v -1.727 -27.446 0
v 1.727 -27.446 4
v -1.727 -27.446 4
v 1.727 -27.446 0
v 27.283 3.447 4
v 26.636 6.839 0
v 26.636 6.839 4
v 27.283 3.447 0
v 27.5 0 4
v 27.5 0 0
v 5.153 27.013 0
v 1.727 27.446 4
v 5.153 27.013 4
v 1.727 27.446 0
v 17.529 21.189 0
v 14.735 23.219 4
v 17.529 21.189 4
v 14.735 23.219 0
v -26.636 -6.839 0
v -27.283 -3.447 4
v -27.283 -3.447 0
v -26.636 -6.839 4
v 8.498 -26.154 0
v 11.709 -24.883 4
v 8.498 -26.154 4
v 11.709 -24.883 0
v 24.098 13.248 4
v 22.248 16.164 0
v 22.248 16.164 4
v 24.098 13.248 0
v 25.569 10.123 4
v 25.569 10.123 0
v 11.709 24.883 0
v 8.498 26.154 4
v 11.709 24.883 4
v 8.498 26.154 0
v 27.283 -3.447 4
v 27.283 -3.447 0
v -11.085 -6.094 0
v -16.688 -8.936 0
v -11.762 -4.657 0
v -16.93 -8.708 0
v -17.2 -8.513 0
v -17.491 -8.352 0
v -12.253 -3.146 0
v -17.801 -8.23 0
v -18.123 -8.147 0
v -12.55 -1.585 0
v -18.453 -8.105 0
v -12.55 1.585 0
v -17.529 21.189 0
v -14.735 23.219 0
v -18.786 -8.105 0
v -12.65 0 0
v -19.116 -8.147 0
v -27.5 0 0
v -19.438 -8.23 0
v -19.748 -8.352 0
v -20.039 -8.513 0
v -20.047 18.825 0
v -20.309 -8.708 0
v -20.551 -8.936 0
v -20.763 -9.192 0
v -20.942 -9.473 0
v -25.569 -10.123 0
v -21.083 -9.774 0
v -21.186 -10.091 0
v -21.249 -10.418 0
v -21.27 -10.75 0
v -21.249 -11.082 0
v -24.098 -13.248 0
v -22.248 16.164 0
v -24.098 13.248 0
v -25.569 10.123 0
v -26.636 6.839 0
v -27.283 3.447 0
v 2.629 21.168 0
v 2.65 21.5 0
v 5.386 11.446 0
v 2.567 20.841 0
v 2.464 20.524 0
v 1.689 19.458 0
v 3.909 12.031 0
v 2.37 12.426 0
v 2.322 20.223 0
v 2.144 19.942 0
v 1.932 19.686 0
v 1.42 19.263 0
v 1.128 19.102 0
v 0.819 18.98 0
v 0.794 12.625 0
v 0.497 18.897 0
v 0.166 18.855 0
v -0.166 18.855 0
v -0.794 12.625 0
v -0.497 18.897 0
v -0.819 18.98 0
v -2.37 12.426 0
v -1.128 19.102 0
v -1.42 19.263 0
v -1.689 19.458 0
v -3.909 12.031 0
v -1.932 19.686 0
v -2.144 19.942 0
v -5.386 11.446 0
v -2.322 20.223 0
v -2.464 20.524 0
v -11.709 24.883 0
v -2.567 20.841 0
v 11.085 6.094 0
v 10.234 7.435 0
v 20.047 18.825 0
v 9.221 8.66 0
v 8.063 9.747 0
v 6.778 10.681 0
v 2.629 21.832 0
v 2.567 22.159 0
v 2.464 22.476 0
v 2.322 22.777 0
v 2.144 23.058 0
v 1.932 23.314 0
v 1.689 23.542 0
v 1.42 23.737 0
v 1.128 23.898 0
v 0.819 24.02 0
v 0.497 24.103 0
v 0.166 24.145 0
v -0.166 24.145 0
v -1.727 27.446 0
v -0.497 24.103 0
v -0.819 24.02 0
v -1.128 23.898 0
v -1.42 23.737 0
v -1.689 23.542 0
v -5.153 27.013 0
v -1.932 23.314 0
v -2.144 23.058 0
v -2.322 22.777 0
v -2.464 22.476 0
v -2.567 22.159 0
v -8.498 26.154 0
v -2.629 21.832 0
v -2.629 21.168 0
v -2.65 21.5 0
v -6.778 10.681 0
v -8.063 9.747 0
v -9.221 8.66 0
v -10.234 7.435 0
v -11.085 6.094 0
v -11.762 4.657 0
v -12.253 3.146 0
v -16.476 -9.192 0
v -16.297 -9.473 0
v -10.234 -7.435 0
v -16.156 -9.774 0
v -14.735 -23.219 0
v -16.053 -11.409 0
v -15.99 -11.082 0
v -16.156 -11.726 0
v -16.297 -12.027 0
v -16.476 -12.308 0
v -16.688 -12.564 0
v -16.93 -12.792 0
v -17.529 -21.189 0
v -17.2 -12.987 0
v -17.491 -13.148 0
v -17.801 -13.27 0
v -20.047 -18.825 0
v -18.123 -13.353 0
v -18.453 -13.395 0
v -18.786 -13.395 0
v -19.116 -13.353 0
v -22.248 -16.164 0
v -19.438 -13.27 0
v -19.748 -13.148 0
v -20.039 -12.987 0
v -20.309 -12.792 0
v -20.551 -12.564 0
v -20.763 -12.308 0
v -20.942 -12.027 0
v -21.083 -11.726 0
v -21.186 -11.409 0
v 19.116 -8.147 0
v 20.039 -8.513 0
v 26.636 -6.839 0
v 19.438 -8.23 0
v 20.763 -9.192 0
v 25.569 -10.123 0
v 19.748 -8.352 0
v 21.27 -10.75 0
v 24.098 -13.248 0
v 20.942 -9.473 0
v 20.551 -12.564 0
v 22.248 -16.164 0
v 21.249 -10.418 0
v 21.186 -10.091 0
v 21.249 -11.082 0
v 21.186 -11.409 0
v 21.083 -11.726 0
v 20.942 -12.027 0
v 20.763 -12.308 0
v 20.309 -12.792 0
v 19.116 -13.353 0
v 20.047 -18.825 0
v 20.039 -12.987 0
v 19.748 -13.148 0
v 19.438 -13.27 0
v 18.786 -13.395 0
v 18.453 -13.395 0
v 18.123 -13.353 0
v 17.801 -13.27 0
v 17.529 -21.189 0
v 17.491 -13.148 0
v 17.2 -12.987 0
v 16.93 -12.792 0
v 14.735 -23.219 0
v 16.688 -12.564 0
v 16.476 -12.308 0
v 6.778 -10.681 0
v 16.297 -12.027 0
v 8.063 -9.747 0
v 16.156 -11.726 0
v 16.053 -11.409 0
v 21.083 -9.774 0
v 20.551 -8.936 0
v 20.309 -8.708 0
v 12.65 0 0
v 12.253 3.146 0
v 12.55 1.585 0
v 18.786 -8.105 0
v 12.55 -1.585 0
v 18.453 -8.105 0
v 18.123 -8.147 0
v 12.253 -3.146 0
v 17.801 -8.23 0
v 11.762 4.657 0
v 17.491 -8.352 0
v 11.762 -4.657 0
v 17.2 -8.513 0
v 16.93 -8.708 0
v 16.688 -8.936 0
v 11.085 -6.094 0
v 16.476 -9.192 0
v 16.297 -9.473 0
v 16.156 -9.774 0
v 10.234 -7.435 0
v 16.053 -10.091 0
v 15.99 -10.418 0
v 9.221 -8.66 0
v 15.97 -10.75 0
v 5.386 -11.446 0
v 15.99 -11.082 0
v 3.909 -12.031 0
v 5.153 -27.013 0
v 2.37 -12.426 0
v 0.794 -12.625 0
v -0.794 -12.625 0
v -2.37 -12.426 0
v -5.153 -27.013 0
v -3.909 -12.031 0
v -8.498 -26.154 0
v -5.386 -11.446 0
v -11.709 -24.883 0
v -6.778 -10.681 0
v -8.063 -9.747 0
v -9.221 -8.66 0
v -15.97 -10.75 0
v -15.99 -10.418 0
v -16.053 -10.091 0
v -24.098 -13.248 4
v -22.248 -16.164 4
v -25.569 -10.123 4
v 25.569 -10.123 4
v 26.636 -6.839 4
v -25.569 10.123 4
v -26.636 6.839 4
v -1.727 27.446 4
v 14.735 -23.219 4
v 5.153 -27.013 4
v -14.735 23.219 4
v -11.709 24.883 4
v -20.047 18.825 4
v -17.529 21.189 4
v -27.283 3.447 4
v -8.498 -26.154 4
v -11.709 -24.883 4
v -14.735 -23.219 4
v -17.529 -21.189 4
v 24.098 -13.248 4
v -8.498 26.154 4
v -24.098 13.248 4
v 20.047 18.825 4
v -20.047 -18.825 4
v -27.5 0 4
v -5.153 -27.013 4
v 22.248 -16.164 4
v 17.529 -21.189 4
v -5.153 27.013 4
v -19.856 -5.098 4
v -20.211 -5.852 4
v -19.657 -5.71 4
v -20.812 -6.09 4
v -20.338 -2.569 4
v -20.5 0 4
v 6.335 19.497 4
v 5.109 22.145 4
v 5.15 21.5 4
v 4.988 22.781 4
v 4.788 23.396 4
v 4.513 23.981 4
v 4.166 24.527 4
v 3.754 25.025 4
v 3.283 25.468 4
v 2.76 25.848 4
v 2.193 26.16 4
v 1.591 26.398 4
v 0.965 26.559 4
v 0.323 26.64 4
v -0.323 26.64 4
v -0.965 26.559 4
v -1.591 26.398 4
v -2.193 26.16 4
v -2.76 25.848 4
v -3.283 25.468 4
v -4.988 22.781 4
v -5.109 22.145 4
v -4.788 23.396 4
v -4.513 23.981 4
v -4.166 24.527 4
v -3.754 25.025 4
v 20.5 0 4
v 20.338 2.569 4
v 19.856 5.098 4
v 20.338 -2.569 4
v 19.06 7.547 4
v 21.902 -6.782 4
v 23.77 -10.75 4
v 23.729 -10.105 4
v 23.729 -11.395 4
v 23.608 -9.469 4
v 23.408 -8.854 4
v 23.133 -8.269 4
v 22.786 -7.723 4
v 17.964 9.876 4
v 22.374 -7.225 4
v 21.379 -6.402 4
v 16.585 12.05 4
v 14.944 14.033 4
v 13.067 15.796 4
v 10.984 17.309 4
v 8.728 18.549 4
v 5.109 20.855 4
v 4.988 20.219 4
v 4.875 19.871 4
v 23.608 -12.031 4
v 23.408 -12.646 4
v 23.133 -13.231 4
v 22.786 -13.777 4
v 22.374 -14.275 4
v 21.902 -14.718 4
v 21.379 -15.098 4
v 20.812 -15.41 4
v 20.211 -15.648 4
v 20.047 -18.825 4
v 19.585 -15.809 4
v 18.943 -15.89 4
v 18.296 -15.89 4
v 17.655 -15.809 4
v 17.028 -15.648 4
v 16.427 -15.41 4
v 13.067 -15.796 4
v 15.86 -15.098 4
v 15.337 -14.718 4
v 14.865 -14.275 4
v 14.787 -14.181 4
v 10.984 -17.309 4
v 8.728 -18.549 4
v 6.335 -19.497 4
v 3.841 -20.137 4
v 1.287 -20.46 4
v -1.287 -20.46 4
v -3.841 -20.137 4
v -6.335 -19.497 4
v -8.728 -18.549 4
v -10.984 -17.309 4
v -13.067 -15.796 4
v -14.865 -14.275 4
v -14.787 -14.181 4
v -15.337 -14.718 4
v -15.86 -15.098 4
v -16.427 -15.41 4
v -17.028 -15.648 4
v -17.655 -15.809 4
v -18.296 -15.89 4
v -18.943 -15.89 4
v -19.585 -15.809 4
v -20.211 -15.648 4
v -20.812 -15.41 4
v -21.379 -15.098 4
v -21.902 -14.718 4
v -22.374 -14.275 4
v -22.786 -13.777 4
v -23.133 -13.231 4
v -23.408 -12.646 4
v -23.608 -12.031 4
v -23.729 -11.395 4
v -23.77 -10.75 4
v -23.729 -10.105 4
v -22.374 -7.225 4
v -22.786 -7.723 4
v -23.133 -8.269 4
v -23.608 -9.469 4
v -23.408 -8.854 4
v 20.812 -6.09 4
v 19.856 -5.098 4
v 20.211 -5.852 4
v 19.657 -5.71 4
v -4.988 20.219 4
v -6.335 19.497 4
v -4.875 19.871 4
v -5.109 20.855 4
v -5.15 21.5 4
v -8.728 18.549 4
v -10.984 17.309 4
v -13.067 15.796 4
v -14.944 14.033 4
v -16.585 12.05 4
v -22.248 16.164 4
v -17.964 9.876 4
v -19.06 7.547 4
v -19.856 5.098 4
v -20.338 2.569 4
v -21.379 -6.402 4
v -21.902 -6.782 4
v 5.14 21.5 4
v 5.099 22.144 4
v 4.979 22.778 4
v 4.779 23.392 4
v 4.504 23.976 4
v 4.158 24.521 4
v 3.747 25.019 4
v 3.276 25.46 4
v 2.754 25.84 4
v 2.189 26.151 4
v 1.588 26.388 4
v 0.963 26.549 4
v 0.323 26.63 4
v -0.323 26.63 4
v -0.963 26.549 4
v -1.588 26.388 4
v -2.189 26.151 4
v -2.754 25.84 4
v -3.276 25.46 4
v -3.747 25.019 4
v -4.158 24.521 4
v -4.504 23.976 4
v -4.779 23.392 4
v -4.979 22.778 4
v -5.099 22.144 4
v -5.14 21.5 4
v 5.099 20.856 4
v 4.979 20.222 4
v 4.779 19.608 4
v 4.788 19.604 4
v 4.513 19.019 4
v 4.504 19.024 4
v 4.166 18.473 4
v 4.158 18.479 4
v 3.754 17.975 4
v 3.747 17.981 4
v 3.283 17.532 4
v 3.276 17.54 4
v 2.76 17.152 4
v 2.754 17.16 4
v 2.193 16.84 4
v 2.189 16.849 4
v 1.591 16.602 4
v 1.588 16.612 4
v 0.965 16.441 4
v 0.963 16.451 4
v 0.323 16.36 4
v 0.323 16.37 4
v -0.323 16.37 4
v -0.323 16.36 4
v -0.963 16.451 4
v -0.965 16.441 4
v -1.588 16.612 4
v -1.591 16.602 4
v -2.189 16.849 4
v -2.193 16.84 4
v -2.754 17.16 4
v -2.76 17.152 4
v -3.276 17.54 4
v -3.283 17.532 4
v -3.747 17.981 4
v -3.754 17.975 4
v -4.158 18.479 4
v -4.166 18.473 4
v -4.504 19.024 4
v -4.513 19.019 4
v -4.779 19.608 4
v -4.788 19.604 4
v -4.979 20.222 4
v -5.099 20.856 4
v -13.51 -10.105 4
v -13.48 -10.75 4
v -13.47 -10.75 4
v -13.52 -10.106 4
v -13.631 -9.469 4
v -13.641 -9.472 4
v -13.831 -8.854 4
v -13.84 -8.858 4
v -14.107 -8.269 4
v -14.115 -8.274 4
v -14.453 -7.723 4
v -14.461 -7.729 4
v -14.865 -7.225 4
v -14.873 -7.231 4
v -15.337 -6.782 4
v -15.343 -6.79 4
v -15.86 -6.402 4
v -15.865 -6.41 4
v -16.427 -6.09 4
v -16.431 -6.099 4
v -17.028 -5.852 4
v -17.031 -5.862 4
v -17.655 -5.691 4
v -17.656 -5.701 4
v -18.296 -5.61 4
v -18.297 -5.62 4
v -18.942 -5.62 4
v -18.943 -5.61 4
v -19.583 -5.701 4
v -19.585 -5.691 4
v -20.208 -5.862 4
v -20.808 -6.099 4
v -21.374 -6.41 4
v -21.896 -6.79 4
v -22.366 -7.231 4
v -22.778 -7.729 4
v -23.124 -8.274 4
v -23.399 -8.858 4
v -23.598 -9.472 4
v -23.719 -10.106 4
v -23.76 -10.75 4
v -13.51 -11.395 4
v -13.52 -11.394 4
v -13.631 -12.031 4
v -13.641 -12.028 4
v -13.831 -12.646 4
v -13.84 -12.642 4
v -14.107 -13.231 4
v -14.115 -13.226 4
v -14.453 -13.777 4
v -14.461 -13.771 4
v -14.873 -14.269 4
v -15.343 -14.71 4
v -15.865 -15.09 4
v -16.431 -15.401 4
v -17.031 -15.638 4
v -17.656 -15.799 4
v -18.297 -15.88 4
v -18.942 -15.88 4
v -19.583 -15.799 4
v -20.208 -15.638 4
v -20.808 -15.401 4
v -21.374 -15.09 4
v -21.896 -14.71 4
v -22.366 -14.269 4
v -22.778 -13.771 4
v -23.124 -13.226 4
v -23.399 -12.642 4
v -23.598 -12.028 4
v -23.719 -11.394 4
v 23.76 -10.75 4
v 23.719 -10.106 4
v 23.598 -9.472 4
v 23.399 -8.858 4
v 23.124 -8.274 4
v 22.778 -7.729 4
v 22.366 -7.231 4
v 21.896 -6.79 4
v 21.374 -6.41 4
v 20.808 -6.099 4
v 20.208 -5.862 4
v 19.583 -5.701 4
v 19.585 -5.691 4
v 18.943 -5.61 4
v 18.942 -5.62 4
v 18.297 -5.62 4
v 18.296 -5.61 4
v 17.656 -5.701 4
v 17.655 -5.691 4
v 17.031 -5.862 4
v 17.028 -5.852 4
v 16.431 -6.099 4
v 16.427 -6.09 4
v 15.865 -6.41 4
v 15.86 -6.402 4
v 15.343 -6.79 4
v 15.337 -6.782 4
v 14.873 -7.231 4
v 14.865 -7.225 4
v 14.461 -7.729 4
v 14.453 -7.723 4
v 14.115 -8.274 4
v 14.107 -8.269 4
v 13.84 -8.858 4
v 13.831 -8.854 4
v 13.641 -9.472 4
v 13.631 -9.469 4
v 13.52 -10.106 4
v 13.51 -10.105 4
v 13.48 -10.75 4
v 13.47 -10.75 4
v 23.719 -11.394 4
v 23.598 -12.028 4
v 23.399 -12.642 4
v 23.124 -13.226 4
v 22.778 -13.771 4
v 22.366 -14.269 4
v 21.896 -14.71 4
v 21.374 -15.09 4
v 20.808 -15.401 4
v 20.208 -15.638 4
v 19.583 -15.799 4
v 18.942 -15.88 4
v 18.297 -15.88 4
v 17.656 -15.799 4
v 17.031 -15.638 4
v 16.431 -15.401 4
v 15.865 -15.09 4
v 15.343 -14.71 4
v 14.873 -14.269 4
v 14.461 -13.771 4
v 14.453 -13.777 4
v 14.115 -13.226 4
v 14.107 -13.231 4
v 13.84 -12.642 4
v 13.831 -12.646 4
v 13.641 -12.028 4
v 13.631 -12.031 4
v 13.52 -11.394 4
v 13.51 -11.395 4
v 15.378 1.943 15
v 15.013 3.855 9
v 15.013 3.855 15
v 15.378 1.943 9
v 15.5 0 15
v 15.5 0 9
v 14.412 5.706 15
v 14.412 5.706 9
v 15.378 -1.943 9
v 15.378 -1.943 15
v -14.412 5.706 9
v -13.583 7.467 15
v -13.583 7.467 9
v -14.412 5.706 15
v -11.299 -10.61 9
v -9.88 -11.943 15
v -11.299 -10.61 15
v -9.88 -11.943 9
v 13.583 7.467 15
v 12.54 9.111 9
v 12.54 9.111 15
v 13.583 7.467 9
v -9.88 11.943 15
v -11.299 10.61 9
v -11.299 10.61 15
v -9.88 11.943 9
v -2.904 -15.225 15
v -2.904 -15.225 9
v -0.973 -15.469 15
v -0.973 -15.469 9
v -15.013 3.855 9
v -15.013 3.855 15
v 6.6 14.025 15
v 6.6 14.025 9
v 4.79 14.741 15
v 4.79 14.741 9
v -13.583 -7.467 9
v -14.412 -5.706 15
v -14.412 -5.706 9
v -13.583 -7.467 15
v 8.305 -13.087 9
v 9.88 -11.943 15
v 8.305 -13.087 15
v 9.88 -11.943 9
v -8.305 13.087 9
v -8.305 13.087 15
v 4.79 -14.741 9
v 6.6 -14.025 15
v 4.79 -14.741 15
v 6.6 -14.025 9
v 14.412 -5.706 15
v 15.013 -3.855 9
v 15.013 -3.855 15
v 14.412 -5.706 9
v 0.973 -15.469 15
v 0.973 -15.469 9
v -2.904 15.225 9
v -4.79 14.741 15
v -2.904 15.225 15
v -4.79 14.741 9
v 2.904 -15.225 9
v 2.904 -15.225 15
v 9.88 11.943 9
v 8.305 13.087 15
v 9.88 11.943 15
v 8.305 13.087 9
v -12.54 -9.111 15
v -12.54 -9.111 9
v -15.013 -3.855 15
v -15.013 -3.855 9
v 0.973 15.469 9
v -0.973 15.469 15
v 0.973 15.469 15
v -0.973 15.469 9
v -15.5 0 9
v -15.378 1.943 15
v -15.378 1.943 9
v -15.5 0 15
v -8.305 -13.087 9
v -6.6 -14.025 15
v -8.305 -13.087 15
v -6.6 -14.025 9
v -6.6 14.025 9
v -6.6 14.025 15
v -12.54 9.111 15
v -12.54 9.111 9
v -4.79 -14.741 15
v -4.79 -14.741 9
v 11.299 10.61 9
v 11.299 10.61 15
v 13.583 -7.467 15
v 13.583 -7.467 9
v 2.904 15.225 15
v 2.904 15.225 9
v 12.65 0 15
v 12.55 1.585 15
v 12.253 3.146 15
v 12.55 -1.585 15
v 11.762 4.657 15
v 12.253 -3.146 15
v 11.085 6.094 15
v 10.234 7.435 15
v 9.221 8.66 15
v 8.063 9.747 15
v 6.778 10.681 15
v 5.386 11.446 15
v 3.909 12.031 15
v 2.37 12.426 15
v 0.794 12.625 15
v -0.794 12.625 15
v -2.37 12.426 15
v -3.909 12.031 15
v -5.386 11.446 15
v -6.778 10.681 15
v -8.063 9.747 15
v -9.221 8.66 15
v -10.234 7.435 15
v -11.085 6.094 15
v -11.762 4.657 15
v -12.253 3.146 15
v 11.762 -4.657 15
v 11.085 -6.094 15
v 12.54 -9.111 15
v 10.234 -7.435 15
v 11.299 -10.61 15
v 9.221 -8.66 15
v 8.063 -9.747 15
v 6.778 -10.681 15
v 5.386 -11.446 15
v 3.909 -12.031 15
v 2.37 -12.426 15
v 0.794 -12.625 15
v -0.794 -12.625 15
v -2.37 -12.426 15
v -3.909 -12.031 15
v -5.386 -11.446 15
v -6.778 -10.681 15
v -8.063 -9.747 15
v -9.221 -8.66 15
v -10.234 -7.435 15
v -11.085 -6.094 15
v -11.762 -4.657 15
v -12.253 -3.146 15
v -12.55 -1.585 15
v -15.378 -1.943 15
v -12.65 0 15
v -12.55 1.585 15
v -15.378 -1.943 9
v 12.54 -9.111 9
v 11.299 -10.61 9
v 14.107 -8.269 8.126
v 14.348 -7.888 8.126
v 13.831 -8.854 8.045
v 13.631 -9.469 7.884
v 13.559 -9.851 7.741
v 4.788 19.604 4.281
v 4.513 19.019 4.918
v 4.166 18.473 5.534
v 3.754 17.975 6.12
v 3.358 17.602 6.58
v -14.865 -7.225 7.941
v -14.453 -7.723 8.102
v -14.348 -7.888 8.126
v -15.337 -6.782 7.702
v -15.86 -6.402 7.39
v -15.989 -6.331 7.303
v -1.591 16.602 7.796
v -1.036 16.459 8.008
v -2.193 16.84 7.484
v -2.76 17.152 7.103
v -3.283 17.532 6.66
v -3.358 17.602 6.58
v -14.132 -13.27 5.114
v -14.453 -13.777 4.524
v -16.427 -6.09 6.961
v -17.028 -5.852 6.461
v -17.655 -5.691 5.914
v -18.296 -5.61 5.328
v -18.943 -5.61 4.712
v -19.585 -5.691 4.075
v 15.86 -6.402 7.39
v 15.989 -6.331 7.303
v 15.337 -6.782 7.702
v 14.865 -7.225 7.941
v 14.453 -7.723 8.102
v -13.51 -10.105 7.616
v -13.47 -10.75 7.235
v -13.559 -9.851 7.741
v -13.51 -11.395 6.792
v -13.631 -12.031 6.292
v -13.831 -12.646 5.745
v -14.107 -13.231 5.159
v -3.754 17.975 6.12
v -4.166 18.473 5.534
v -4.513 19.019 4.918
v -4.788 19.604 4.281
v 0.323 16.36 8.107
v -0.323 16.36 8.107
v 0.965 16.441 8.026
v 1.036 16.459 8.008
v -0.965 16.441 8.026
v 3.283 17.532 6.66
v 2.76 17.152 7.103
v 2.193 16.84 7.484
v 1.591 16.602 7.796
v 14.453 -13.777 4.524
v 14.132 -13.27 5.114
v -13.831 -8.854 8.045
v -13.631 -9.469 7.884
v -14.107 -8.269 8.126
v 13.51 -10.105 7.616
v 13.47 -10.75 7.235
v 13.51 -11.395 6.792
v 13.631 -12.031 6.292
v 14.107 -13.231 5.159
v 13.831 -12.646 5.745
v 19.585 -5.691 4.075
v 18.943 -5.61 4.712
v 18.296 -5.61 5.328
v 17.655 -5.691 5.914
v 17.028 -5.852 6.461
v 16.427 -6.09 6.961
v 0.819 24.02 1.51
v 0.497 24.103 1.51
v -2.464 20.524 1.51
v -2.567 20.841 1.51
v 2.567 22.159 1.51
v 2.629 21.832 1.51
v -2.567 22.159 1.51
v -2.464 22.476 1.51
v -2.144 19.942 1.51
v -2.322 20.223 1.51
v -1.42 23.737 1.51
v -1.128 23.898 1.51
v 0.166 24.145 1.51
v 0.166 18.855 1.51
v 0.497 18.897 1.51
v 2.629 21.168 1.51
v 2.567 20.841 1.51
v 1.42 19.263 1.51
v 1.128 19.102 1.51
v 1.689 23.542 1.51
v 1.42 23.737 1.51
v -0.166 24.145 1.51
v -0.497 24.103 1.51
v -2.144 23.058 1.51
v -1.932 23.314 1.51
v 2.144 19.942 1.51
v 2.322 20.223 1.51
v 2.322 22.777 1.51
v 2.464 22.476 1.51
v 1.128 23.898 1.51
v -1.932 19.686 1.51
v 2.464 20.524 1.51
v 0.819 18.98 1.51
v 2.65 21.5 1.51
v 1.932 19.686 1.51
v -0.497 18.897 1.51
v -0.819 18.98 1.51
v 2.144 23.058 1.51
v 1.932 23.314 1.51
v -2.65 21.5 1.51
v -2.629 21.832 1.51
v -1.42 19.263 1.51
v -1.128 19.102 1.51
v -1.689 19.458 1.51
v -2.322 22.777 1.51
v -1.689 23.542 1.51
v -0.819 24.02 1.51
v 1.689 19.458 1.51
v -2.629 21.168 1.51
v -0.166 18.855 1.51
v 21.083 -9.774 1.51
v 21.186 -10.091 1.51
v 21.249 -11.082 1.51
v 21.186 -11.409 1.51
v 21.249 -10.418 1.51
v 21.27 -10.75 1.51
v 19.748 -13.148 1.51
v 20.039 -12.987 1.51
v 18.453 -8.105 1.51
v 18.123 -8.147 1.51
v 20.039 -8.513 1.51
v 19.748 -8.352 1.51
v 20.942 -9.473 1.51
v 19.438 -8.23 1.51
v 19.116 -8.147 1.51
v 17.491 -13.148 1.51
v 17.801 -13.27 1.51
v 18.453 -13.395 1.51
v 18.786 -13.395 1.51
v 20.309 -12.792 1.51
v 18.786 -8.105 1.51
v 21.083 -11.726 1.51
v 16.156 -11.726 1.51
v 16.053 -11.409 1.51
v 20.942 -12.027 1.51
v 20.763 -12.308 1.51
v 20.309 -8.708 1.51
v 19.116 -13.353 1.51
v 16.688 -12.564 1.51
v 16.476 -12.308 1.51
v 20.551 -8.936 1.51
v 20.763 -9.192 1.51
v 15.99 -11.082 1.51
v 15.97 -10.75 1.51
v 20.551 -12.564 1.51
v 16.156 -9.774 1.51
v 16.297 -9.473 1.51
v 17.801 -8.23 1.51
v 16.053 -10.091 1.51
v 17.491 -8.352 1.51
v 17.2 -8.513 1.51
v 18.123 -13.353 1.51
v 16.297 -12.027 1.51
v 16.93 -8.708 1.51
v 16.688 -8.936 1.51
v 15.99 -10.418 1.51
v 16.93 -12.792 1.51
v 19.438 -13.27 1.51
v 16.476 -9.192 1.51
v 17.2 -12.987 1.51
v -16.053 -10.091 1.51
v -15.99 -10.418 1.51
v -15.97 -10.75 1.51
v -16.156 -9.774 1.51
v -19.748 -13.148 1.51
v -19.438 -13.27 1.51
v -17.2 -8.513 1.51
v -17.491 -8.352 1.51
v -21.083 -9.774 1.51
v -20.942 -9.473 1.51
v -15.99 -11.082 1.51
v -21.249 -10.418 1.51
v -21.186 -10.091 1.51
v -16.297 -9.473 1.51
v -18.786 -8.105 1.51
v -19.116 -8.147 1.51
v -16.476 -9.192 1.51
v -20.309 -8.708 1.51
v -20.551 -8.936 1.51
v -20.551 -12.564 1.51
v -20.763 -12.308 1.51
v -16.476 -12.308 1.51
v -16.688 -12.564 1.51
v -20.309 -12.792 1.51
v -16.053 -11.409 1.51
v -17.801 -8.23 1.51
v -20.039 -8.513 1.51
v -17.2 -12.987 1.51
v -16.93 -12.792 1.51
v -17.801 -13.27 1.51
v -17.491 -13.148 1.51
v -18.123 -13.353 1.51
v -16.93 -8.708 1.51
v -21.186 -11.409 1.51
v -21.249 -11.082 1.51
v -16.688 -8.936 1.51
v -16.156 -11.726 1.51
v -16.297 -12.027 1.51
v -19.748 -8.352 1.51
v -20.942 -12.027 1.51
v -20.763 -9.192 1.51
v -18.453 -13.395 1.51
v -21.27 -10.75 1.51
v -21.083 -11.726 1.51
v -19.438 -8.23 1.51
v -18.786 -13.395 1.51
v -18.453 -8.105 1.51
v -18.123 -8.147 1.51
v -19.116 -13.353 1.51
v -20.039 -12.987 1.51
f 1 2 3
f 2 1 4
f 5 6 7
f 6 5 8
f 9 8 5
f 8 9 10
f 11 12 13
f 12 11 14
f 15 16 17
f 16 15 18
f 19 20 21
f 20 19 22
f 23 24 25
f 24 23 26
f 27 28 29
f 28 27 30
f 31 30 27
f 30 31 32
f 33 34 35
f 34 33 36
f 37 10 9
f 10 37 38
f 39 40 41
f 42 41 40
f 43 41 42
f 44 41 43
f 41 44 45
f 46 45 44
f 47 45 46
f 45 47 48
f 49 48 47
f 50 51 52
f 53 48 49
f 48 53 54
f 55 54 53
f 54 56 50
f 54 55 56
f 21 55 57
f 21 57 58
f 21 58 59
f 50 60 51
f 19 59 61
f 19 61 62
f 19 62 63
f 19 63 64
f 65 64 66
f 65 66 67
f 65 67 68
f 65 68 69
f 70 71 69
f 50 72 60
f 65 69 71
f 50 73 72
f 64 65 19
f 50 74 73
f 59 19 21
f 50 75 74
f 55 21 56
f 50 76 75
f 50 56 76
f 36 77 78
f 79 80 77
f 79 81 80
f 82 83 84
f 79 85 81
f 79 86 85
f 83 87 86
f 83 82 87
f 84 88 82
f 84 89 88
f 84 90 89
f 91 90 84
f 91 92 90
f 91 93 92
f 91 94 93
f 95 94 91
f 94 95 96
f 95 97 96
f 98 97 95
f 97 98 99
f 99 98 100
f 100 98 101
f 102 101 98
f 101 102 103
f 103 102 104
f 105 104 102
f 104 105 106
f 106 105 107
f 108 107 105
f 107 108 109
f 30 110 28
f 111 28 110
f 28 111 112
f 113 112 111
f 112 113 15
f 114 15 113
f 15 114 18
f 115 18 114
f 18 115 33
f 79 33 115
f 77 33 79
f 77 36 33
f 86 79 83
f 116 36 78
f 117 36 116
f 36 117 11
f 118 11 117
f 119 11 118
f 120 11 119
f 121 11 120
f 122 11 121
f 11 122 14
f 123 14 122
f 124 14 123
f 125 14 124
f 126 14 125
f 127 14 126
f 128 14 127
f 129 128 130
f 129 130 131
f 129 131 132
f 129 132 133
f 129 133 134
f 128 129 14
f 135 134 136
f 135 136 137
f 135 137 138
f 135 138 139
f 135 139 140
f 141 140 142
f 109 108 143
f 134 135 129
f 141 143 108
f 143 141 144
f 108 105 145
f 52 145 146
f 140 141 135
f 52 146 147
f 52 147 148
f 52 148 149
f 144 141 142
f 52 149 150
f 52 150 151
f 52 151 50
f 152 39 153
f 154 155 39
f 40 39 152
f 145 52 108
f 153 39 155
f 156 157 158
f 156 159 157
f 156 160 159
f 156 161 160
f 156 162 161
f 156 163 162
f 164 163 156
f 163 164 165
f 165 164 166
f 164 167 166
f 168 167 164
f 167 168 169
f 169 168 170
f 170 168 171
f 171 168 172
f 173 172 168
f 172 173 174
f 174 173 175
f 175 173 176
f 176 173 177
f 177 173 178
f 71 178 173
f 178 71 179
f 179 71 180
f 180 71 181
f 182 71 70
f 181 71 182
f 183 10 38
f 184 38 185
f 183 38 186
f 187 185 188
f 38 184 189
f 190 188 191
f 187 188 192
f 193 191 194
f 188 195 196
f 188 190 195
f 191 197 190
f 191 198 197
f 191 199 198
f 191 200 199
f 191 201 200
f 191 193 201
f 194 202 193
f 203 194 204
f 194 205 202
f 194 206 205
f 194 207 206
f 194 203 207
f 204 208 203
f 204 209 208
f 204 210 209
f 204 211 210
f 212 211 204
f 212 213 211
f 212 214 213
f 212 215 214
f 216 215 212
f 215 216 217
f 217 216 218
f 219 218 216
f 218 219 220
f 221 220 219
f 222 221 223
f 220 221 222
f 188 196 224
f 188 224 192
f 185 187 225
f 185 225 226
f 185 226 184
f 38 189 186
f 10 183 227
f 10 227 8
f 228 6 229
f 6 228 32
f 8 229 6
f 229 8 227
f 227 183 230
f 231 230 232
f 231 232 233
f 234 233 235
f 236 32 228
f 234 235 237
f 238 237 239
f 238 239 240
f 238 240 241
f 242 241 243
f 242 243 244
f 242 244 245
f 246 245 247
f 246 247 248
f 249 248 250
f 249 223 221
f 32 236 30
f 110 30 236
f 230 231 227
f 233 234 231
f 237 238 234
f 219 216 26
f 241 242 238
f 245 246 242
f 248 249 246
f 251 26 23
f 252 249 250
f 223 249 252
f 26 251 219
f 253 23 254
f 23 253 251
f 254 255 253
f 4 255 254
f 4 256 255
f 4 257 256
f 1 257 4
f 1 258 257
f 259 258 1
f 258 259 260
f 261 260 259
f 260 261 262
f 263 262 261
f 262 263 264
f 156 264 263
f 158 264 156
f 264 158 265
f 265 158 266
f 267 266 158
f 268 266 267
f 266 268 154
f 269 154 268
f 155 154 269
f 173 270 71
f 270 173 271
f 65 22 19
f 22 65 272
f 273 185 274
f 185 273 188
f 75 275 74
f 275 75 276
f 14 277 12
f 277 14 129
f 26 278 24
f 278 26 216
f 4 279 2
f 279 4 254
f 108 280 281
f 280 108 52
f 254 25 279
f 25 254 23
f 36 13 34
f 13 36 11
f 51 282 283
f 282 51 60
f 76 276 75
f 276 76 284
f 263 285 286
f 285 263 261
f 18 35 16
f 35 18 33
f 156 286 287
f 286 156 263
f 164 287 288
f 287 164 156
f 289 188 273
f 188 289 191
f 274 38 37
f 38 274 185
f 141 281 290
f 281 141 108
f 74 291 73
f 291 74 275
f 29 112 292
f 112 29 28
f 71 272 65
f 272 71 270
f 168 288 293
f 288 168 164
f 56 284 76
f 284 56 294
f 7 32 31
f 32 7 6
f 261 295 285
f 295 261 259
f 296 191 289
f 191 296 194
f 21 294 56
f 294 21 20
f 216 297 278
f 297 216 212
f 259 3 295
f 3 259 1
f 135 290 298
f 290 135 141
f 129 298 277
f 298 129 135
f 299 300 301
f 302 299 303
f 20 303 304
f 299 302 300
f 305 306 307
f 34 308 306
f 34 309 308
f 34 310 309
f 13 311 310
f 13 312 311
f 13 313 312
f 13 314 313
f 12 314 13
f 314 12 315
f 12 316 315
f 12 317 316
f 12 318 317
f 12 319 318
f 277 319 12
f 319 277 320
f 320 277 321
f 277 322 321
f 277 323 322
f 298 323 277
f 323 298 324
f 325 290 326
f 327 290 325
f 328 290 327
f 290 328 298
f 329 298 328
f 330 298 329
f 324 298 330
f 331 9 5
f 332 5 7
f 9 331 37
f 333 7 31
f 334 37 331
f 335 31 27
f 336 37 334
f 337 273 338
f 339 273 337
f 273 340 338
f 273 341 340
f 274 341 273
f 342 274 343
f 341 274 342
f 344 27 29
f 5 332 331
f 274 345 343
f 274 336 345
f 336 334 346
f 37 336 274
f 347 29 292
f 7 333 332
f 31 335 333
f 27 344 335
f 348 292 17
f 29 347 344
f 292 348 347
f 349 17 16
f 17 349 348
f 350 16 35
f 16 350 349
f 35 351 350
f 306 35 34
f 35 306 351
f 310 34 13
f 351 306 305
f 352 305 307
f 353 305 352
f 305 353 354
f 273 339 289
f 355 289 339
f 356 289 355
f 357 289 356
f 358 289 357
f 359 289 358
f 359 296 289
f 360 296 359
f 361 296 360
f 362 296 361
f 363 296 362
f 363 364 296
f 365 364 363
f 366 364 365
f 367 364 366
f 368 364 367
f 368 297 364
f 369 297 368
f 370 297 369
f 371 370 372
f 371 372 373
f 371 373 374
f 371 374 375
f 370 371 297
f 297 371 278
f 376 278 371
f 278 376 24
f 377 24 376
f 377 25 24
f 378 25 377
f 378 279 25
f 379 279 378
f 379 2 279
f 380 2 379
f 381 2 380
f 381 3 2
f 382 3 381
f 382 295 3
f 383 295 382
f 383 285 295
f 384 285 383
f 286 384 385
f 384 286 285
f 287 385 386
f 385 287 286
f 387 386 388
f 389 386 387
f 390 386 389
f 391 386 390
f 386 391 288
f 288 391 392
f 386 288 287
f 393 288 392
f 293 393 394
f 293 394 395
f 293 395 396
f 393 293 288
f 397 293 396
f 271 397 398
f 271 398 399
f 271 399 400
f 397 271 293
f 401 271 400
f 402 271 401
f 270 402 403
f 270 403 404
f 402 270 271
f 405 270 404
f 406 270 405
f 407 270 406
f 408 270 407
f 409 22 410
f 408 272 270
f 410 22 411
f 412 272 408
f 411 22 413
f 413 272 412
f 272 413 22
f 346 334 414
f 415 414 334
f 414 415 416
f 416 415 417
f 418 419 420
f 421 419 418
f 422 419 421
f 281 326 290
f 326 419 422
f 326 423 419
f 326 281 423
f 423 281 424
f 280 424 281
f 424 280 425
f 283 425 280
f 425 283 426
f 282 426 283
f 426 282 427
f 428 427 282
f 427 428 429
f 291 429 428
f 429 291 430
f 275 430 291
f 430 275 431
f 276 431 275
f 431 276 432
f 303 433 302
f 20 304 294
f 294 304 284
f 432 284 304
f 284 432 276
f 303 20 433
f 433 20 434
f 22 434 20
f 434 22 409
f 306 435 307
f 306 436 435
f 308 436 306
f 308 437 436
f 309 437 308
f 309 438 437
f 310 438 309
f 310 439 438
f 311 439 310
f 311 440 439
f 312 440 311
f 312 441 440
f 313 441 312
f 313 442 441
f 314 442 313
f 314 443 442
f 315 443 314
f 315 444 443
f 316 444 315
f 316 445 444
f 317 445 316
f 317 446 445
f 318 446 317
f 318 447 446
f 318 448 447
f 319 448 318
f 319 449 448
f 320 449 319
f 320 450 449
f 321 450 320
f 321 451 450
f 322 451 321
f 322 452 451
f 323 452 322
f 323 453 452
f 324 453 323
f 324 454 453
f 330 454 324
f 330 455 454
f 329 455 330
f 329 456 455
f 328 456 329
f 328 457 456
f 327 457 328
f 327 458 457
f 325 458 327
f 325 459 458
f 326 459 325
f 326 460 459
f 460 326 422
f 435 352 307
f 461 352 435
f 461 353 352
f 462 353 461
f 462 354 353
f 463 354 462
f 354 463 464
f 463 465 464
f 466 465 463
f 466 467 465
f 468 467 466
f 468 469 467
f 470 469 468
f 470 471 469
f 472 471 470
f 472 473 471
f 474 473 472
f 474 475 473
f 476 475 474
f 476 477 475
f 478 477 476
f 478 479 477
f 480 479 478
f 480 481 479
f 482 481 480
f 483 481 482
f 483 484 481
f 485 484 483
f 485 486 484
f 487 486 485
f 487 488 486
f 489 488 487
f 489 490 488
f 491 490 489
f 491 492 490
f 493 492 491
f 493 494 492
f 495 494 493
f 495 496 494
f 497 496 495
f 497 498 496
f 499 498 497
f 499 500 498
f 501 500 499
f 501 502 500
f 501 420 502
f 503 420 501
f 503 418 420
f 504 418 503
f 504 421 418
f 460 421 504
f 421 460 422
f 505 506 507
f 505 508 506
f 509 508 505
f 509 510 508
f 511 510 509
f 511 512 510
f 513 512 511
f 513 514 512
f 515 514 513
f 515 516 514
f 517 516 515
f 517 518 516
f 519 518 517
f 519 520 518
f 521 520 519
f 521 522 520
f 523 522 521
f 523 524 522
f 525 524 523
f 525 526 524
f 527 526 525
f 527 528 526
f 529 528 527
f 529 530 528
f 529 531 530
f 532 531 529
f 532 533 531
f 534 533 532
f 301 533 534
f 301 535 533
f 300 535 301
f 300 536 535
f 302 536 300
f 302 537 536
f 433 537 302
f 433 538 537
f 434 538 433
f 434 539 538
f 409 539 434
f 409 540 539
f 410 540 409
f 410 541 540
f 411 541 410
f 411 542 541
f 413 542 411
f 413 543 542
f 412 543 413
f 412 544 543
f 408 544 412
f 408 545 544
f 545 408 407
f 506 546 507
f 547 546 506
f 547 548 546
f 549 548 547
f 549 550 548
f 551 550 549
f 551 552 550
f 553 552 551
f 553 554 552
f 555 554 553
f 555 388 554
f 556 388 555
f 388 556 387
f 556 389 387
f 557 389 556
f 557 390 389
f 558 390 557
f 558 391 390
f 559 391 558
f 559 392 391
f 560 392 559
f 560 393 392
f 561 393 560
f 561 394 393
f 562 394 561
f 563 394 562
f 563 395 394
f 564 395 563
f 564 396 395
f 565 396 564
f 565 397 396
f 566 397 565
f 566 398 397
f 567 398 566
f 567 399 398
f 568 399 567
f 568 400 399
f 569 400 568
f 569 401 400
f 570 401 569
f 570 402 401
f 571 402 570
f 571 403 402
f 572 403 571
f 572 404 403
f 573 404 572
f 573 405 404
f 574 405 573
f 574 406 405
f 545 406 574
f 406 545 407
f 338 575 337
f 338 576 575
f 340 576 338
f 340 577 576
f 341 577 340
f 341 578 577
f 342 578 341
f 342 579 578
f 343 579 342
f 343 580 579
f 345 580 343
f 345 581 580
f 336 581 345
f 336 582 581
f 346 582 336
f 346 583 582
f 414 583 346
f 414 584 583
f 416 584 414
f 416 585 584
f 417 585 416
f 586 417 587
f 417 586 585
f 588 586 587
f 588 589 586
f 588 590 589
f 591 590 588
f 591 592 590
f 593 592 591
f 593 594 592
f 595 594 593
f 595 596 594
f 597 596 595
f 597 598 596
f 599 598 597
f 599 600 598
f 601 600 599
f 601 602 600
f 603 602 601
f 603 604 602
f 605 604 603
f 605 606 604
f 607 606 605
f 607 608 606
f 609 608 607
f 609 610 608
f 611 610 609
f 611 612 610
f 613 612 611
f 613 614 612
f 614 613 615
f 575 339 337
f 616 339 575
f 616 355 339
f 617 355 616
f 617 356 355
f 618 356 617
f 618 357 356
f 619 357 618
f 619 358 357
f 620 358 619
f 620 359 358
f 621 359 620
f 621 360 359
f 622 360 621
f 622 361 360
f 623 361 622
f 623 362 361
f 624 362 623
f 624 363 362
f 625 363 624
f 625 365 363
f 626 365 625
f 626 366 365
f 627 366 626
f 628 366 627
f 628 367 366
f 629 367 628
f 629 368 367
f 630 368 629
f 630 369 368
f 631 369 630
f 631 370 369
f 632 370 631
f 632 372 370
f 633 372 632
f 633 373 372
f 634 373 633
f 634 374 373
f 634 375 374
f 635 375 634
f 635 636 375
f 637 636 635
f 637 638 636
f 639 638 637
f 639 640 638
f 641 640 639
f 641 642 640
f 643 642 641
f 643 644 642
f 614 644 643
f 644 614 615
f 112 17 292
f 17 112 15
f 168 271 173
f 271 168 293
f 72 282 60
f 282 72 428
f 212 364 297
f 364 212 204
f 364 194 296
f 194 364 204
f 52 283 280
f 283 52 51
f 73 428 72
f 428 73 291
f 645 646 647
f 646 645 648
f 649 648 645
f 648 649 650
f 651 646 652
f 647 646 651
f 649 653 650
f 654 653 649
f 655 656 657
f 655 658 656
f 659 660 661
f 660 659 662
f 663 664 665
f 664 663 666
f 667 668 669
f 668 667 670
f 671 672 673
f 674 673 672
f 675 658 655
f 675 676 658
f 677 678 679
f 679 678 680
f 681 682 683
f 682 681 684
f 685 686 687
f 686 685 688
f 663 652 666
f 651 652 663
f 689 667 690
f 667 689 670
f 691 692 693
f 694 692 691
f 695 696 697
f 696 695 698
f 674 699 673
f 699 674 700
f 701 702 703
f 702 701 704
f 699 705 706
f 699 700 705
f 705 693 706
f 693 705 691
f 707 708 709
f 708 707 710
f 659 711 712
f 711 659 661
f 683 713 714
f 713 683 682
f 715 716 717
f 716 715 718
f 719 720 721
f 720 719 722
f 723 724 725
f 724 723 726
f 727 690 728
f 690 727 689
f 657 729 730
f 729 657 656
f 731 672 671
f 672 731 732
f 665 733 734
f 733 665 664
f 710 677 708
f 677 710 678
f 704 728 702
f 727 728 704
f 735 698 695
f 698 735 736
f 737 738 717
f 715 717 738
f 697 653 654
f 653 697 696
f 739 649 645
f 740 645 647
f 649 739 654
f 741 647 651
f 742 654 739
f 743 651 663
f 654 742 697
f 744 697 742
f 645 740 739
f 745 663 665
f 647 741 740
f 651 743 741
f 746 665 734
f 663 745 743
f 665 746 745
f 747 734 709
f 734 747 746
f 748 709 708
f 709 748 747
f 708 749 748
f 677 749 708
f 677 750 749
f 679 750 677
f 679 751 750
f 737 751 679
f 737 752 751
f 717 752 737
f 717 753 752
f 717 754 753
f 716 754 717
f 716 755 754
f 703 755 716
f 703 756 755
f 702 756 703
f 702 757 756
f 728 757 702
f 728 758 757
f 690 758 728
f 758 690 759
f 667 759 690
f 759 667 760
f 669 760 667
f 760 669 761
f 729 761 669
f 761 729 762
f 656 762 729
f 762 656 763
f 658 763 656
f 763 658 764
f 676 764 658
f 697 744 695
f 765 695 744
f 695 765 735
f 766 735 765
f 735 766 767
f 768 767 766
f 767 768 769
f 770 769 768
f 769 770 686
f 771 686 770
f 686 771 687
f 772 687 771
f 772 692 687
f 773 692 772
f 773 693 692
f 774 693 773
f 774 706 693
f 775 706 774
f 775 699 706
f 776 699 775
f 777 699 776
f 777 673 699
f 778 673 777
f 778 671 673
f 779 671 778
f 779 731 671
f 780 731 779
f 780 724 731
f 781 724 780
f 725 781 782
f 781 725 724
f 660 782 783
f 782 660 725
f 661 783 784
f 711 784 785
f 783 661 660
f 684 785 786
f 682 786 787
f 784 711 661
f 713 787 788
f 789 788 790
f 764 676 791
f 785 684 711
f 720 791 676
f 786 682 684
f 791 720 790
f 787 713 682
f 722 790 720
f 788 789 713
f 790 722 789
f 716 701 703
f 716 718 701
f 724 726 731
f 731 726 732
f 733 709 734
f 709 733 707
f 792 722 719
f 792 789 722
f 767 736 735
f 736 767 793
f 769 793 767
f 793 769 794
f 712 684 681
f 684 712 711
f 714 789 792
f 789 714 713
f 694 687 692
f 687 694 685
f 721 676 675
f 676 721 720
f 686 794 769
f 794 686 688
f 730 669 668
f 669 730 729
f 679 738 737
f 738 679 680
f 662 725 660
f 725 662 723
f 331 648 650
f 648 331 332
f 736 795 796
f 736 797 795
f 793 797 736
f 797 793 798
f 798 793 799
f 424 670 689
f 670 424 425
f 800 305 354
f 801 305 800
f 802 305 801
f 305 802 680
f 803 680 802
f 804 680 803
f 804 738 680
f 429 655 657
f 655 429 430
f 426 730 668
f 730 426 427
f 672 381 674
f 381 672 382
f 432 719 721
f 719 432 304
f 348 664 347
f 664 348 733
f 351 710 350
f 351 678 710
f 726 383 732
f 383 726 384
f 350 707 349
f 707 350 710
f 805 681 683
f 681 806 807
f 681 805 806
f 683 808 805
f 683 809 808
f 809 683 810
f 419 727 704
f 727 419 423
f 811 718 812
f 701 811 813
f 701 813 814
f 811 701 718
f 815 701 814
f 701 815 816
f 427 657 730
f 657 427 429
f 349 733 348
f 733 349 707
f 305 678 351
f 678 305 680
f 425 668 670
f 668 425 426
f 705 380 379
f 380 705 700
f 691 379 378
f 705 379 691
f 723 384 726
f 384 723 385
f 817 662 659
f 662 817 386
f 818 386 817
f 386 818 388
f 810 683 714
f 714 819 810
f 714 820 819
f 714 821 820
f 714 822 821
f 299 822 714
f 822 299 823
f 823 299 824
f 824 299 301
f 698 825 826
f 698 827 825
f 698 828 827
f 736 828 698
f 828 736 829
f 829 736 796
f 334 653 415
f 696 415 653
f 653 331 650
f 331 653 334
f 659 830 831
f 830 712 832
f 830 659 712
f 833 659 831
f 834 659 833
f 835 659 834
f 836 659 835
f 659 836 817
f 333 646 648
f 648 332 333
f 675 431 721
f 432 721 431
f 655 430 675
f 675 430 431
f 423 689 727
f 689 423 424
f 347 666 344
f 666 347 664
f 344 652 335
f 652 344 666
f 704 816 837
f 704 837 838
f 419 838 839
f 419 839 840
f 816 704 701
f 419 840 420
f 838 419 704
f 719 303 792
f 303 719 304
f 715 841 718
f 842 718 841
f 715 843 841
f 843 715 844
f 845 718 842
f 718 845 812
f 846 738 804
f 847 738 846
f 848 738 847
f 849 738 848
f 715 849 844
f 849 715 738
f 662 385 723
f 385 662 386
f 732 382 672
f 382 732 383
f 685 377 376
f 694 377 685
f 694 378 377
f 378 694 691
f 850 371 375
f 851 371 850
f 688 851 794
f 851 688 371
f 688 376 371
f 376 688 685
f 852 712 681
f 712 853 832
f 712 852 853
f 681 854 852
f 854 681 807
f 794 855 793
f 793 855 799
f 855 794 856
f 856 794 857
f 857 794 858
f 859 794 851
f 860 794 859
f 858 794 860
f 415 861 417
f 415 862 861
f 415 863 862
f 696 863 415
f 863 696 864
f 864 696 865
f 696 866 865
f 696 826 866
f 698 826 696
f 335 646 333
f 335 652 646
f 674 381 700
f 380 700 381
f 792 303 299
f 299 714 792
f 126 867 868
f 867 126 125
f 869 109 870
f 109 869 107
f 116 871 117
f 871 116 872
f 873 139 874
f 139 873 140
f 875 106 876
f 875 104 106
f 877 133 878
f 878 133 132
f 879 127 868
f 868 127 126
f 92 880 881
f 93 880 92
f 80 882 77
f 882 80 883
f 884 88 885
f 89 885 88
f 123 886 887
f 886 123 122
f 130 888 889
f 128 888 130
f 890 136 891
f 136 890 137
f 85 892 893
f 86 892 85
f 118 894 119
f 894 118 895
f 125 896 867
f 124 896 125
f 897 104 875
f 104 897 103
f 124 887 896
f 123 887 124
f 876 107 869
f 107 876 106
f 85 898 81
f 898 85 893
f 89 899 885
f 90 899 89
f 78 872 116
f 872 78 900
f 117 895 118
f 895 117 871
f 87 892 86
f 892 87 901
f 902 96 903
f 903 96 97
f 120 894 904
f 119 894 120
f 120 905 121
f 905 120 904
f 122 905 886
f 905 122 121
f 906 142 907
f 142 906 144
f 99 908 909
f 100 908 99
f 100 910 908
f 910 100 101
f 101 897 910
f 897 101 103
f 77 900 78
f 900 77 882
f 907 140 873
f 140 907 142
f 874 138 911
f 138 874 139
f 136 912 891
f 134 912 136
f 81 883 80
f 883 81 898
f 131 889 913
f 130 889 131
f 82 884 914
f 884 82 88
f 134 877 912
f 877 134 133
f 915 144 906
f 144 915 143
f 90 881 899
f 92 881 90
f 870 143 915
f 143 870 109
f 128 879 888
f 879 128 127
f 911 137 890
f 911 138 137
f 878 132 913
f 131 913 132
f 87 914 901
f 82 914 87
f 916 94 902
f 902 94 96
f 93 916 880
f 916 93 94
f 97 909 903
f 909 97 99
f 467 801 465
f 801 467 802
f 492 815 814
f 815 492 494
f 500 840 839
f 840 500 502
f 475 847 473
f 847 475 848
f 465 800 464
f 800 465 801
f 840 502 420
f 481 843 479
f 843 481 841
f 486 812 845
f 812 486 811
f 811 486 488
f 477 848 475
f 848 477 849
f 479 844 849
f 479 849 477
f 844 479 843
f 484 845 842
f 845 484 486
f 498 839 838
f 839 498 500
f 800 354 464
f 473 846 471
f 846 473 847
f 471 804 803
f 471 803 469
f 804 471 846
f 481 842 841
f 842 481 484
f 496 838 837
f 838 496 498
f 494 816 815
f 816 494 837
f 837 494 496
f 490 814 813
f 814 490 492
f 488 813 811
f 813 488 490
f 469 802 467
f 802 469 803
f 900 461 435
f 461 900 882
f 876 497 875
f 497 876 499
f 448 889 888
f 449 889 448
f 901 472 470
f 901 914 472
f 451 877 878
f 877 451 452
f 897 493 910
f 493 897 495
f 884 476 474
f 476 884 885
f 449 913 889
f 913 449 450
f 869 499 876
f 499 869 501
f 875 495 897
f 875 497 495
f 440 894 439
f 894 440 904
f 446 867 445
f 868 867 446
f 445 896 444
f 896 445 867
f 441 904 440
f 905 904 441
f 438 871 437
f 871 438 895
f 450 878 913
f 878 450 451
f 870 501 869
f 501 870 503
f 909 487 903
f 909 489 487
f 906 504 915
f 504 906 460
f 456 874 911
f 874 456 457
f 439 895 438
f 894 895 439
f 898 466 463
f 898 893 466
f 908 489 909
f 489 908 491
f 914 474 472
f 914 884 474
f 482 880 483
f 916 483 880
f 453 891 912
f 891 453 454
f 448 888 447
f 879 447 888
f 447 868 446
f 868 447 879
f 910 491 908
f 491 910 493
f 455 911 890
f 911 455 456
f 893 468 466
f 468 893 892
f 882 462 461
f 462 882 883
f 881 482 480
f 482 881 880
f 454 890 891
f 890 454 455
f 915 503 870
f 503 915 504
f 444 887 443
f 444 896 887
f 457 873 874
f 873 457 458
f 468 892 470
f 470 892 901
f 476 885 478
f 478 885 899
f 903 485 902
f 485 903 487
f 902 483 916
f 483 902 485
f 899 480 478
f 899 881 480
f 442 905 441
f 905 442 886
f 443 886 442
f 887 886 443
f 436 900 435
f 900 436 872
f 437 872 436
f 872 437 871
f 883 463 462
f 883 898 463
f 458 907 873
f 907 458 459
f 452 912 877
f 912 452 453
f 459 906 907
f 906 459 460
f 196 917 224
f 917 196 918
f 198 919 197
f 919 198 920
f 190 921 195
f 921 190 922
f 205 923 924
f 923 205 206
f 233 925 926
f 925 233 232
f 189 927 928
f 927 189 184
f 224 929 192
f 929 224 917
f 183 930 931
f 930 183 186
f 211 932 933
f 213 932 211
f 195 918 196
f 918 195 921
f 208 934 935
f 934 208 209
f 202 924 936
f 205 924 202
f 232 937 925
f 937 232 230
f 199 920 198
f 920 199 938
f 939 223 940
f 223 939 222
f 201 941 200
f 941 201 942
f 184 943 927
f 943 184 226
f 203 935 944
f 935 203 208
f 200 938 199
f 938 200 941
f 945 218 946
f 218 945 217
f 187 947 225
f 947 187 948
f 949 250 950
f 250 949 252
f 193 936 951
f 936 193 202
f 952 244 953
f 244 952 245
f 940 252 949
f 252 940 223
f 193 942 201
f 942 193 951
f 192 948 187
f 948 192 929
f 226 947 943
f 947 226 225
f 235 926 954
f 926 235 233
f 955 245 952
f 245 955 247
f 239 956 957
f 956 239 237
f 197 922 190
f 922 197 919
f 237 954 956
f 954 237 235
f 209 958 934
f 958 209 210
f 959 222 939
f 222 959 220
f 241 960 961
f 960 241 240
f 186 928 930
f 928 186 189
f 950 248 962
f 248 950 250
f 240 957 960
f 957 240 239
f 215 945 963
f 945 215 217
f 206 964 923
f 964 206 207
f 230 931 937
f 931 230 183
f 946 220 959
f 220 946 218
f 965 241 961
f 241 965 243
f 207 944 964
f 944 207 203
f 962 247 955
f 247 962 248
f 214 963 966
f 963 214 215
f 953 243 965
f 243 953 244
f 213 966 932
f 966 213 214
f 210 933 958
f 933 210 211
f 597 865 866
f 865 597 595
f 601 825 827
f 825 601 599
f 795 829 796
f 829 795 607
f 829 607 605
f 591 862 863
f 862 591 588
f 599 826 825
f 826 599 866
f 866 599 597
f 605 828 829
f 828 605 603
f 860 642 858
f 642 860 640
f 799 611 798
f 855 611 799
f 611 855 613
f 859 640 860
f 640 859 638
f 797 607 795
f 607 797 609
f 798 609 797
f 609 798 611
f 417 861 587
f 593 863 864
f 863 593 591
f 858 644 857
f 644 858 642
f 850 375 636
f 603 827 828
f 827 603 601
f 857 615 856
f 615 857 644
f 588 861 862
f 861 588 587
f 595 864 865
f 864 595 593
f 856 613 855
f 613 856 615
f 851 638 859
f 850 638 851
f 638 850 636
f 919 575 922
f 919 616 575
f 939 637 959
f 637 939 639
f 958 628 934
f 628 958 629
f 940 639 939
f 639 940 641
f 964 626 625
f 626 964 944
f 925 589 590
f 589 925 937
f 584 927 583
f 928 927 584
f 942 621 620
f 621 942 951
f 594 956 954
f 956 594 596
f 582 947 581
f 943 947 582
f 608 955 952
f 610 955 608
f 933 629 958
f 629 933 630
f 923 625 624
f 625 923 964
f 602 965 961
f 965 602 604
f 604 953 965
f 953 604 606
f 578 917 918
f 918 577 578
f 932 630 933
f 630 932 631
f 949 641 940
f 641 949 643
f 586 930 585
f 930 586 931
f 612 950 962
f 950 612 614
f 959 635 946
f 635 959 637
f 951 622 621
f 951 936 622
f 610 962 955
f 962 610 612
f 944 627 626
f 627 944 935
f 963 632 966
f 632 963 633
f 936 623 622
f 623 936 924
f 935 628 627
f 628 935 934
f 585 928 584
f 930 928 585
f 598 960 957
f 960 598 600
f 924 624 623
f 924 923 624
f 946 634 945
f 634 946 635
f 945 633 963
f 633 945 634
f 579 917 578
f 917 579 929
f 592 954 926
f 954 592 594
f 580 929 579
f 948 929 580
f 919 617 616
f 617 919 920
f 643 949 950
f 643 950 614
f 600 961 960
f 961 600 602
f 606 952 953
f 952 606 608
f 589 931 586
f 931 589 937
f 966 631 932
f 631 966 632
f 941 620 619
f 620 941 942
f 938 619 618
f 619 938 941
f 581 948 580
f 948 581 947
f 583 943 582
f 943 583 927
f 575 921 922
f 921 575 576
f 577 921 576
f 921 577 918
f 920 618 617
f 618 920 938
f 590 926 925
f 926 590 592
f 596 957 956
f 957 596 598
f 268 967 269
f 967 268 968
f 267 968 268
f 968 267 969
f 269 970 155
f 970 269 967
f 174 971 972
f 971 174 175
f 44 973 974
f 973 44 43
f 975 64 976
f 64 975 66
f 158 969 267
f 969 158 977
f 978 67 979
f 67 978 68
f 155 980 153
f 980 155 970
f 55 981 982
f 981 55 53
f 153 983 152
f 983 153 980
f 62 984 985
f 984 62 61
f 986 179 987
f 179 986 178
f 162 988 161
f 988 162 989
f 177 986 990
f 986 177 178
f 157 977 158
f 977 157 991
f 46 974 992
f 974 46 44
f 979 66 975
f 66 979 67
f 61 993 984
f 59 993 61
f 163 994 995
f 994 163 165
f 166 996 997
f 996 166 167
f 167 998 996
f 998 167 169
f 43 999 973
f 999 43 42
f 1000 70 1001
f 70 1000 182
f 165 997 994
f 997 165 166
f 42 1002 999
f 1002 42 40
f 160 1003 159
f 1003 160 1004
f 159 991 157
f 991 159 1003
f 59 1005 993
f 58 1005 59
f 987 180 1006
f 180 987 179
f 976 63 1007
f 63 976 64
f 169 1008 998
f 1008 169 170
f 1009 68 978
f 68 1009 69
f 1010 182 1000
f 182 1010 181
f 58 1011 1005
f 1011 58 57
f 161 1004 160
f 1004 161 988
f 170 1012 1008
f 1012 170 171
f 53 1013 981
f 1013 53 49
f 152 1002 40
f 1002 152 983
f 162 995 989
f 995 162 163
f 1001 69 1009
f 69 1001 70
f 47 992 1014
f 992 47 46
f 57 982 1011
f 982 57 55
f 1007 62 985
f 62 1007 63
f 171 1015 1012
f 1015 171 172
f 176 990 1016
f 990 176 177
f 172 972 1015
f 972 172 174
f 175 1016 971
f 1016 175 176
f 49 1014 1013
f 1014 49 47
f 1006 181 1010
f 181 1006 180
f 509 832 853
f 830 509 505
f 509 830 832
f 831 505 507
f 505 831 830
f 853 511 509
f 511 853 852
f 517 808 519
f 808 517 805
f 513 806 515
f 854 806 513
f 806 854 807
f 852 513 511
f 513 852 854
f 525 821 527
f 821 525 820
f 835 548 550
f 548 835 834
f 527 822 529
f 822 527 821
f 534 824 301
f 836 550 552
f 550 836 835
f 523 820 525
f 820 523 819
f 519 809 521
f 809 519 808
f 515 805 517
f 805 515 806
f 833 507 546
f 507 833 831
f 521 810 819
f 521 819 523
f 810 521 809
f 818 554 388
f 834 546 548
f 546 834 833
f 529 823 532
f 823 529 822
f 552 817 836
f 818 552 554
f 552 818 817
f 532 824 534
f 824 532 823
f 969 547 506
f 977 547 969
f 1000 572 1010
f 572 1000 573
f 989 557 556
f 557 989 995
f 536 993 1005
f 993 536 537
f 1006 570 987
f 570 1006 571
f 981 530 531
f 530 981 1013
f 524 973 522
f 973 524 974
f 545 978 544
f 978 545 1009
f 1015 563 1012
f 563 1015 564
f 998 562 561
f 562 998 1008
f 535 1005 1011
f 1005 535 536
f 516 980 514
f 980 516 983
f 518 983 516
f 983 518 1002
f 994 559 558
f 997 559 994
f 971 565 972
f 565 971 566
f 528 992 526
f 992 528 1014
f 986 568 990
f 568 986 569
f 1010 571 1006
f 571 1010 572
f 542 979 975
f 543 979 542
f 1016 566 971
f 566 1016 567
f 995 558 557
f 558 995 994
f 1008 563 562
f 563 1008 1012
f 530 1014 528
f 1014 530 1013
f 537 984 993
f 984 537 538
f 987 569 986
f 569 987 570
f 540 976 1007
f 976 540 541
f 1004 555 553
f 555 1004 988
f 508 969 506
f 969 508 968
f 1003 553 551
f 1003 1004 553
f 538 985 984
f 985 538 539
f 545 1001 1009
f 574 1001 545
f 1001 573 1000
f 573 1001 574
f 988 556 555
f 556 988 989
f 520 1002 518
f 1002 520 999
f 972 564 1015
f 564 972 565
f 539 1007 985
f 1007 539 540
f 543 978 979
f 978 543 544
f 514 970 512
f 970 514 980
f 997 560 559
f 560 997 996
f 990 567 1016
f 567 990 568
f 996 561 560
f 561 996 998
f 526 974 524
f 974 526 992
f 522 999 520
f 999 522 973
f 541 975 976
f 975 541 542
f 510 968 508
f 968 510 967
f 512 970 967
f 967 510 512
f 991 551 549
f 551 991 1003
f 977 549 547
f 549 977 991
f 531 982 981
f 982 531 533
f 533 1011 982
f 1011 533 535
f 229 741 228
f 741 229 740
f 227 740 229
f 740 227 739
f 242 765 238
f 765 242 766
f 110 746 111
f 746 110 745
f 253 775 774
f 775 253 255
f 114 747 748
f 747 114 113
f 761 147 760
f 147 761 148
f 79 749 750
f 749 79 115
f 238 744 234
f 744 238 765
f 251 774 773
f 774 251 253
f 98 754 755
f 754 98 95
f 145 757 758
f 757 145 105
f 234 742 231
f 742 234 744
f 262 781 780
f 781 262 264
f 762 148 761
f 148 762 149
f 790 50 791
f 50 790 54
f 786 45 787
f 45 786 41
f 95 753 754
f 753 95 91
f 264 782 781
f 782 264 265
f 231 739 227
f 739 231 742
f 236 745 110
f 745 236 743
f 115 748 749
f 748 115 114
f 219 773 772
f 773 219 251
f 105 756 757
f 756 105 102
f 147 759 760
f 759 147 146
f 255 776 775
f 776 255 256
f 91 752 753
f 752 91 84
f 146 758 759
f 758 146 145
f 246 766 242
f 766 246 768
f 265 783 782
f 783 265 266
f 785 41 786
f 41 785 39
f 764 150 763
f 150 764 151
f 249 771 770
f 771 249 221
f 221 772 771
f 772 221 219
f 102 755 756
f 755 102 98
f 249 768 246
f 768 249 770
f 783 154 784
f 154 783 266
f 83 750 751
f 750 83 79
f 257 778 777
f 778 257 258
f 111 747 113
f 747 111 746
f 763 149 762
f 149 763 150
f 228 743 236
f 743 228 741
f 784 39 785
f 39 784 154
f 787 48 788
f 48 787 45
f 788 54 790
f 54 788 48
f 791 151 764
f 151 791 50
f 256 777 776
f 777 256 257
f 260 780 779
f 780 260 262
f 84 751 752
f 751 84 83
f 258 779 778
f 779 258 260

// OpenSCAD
/* [Center hole parameters] */
$fn = 50;
// Overall height of the design
height = 15;
// Size of the center hole
hole_diameter = 25;
// Thickness of the center hole
hole_wall_thickness = 3;

/* [Flange] */

// Radius of the base
flange_diameter = 55;
// Thickness of the base
flange_thickness = 4;

/* [Attachment holes] */

// Number of attachment holes
attachment_holes = 3;
// Size of the attachment holes
attachment_hole_diameter = 5;
// How far attachment is from middlepoint between outer and inner edge. Positive value moves towards outer edge, negative towards inner edge.
attachment_offset = 0;
// Size of the screw head for the attachment
attachment_head_diameter = 10;
// select this if you want countersunk holes for the screw heads
attachment_head_hole = "countersink"; // [none, countersink]

/* [Miscellaneous settings] */

// Size added to all holes to account for printing inaccuracy
tolerance = 0.15;
corner_chamfer = 5;

flange_radius = flange_diameter / 2;
c_hole_radius = hole_diameter / 2 + tolerance;
a_hole_radius = attachment_hole_diameter / 2 + tolerance;
a_head_radius = attachment_head_diameter / 2 + tolerance;

center_radius = hole_diameter / 2 + hole_wall_thickness;
a_distance = (flange_diameter / 2 + center_radius) / 2 + attachment_offset;

difference() {
    union() {
        // flange disk or the base
        cylinder(flange_thickness, flange_radius, flange_radius);
        
        // the pipe looking part
        cylinder(height, center_radius, center_radius);
        
        // chamfer
        translate([0, 0, flange_thickness]) cylinder(center_radius + corner_chamfer, center_radius + corner_chamfer, 0);
    }

    union() {
        // center hole
        cylinder(height * 5, c_hole_radius, c_hole_radius);
        
        // attachment holes
        hole_angle = 360 / attachment_holes;
        for (i = [0: attachment_holes]) {
            translate([sin(hole_angle * i) * a_distance,  cos(hole_angle * i) * a_distance, -1]) cylinder(height, a_hole_radius, a_hole_radius);
             translate([sin(hole_angle * i) * a_distance,  cos(hole_angle * i) * a_distance, flange_thickness]) cylinder(height, a_head_radius, a_head_radius);
            // attachment head holes
            if (attachment_head_hole == "countersink") {
                translate([sin(hole_angle * i) * a_distance,  cos(hole_angle * i) * a_distance, flange_thickness+0.01]) rotate([180, 0, 0]) cylinder(a_head_radius, a_head_radius, 0);
            }
        }
    }
}
